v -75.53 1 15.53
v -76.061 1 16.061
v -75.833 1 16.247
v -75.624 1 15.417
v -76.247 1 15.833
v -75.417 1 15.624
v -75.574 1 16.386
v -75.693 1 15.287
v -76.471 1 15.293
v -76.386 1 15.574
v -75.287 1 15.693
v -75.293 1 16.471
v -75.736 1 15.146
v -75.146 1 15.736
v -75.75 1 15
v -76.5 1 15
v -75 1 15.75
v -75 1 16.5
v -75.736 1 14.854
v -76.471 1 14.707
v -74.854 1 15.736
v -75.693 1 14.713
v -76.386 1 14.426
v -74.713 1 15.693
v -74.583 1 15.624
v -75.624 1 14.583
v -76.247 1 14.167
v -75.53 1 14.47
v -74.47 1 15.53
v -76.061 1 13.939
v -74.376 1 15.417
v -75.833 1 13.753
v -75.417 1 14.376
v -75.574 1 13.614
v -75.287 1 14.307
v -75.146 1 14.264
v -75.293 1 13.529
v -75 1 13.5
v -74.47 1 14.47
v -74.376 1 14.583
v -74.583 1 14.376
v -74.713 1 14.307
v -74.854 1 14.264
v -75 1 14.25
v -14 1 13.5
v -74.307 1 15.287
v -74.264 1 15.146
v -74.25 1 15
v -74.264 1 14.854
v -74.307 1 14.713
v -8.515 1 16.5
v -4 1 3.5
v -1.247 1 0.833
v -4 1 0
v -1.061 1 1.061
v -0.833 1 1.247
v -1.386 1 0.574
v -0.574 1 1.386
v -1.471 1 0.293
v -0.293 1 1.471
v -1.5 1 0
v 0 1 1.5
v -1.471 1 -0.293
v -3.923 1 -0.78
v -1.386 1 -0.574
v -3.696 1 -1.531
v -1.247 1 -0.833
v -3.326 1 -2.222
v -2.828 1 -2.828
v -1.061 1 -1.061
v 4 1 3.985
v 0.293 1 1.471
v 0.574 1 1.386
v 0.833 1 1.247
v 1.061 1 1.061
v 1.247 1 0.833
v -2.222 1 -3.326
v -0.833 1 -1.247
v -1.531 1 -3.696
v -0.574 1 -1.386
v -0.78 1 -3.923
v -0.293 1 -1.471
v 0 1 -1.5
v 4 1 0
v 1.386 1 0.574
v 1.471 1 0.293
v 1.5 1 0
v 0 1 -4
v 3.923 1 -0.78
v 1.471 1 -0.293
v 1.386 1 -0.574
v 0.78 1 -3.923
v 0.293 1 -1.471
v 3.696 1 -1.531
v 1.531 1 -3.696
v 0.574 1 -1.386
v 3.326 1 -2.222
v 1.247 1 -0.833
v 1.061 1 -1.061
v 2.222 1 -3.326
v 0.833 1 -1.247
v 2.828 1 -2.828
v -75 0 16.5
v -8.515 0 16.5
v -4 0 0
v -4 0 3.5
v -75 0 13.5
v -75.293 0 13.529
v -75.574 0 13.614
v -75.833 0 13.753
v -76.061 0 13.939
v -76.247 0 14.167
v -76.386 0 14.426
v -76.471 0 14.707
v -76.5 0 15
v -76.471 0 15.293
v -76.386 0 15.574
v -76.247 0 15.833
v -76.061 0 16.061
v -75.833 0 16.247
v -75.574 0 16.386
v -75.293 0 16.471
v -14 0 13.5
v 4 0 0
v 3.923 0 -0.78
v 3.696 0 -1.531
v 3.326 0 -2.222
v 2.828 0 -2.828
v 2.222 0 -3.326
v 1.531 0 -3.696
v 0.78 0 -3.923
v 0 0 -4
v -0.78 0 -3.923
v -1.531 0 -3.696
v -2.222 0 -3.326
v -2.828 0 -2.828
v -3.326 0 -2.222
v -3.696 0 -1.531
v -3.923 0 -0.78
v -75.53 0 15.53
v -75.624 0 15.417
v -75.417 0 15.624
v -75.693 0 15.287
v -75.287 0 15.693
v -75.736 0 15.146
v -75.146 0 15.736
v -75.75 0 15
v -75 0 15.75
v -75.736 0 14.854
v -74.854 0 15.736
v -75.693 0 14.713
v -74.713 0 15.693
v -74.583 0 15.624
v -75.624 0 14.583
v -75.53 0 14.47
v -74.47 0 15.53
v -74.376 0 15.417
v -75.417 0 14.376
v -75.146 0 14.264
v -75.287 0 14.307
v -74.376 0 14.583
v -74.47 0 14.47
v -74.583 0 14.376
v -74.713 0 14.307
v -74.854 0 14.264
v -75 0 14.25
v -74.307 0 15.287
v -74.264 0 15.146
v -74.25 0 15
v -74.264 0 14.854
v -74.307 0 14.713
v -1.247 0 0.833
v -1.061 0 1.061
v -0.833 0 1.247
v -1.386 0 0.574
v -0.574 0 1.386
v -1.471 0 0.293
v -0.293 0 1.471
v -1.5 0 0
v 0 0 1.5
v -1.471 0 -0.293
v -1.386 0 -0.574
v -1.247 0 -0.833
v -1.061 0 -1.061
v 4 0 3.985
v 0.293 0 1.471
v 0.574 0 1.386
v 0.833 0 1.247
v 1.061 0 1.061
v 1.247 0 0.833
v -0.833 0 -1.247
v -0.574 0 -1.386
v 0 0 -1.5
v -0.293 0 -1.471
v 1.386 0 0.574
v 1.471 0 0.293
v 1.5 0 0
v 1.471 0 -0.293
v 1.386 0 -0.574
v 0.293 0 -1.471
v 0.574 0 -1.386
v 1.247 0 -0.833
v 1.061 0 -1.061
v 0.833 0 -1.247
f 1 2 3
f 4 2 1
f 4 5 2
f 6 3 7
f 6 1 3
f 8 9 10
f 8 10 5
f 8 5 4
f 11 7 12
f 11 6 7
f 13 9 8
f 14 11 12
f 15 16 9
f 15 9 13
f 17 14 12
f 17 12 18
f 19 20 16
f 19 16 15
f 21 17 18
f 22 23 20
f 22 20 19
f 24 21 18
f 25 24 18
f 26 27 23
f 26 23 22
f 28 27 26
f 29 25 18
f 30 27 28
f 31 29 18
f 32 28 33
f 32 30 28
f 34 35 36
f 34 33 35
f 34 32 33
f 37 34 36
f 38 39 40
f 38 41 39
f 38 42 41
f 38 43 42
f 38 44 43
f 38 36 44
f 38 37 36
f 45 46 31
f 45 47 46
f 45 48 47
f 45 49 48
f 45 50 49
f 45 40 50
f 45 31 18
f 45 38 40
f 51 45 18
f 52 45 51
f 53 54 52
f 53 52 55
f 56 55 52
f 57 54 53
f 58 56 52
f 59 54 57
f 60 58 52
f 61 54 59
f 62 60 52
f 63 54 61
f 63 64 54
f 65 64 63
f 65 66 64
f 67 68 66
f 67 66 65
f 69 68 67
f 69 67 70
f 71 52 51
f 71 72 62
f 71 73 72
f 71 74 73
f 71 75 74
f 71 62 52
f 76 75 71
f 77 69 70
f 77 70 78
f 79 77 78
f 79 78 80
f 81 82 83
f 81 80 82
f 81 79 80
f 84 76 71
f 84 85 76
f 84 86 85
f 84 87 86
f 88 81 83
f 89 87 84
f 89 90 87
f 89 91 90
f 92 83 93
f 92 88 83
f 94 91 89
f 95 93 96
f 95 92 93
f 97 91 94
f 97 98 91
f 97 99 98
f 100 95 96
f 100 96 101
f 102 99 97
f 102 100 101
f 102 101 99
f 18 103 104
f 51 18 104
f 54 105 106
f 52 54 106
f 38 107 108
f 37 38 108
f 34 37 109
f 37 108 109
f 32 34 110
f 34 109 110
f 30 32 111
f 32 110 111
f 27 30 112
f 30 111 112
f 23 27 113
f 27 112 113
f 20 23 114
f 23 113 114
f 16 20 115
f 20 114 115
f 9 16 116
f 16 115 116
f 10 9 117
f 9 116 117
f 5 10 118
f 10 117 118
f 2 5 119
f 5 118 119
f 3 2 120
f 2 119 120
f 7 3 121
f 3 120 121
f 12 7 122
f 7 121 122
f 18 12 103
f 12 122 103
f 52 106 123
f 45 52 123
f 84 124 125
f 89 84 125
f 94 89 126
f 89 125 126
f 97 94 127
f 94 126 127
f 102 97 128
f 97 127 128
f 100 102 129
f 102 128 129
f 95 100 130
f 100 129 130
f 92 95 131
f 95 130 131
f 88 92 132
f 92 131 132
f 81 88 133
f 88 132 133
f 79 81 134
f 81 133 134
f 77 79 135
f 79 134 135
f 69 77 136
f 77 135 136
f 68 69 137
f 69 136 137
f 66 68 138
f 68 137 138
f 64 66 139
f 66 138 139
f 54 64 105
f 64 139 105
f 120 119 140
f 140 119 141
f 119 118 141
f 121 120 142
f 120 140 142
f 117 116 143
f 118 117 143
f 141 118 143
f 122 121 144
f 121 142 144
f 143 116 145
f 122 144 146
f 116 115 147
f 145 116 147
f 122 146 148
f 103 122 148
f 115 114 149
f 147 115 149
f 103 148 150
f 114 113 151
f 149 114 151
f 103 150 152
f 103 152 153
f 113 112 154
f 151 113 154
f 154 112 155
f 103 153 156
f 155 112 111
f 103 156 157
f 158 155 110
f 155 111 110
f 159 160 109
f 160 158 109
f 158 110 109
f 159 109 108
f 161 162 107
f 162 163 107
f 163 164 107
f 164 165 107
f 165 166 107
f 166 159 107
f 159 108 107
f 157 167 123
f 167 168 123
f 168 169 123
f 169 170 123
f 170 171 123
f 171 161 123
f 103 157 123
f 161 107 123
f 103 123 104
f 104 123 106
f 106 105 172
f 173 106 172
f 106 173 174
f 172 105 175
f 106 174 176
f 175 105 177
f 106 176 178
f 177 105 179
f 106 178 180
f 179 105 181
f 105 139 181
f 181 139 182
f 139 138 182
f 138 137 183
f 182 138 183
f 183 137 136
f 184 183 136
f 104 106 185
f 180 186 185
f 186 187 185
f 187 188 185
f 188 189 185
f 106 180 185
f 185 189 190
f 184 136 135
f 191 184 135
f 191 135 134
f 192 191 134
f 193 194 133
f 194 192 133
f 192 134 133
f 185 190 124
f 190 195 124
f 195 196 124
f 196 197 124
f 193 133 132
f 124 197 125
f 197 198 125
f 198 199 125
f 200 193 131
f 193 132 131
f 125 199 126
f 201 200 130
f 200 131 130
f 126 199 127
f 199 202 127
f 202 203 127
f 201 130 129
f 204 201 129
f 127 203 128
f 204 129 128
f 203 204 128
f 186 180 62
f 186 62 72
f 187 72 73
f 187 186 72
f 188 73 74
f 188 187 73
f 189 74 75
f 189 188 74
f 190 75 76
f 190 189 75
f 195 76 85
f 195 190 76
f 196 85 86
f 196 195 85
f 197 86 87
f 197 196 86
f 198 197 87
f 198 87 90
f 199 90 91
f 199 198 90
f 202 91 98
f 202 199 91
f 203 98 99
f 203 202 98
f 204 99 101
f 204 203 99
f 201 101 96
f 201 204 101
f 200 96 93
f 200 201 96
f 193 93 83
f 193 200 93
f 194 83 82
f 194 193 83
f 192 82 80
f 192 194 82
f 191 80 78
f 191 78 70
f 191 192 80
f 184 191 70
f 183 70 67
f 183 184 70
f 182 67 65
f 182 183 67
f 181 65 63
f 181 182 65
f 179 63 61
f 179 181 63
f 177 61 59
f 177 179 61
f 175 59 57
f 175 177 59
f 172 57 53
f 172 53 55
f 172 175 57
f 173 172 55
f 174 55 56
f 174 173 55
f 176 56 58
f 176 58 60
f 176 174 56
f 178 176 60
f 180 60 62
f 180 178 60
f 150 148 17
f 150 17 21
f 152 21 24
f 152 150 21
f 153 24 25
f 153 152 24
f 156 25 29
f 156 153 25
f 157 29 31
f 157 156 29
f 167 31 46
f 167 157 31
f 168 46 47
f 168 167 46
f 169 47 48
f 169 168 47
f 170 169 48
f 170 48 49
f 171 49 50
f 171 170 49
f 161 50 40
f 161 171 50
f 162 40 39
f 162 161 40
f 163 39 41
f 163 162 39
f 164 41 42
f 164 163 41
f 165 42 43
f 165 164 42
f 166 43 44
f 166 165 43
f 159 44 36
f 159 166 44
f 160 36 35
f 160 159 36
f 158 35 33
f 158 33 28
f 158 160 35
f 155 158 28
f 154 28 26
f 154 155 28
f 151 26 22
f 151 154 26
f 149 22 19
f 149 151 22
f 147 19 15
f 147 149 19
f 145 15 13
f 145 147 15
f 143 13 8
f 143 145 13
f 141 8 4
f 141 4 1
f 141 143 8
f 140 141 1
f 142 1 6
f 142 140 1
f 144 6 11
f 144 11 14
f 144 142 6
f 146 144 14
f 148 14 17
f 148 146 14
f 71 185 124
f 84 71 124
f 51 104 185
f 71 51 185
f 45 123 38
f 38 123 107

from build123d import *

# Parameters (mm, degrees)
SKETCH1_R           = 1.5
SKETCH1_R_2         = 0.75
BOSS_EXTRUDE1_DEPTH = 1


with BuildPart() as part:
    # Sketch1 → Boss-Extrude1 (new body)
    with BuildSketch(Plane(origin=(0, 0, 0), x_dir=(1, 0, 0), z_dir=(0, 1, 0))):
        with BuildLine():
            Line((-4, 0), (-4, -3.5))
            Line((-4, -3.5), (-14, -13.5))
            Line((-14, -13.5), (-75, -13.5))
            ThreePointArc((-75, -13.5), (-76.5, -15), (-75, -16.5))
            Line((-75, -16.5), (-8.514718626, -16.5))
            Line((-8.514718626, -16.5), (4, -3.985281374))
            Line((4, -3.985281374), (4, 0))
            ThreePointArc((4, 0), (0, 4), (-4, 0))
        make_face()
        with Locations(Location((0, 0, 0), (0, 0, 270))):
            Circle(SKETCH1_R, mode=Mode.SUBTRACT)
        with Locations(Location((-75, -15, 0), (0, 0, 270))):
            Circle(SKETCH1_R_2, mode=Mode.SUBTRACT)
    extrude(amount=BOSS_EXTRUDE1_DEPTH)


solid = part.part
